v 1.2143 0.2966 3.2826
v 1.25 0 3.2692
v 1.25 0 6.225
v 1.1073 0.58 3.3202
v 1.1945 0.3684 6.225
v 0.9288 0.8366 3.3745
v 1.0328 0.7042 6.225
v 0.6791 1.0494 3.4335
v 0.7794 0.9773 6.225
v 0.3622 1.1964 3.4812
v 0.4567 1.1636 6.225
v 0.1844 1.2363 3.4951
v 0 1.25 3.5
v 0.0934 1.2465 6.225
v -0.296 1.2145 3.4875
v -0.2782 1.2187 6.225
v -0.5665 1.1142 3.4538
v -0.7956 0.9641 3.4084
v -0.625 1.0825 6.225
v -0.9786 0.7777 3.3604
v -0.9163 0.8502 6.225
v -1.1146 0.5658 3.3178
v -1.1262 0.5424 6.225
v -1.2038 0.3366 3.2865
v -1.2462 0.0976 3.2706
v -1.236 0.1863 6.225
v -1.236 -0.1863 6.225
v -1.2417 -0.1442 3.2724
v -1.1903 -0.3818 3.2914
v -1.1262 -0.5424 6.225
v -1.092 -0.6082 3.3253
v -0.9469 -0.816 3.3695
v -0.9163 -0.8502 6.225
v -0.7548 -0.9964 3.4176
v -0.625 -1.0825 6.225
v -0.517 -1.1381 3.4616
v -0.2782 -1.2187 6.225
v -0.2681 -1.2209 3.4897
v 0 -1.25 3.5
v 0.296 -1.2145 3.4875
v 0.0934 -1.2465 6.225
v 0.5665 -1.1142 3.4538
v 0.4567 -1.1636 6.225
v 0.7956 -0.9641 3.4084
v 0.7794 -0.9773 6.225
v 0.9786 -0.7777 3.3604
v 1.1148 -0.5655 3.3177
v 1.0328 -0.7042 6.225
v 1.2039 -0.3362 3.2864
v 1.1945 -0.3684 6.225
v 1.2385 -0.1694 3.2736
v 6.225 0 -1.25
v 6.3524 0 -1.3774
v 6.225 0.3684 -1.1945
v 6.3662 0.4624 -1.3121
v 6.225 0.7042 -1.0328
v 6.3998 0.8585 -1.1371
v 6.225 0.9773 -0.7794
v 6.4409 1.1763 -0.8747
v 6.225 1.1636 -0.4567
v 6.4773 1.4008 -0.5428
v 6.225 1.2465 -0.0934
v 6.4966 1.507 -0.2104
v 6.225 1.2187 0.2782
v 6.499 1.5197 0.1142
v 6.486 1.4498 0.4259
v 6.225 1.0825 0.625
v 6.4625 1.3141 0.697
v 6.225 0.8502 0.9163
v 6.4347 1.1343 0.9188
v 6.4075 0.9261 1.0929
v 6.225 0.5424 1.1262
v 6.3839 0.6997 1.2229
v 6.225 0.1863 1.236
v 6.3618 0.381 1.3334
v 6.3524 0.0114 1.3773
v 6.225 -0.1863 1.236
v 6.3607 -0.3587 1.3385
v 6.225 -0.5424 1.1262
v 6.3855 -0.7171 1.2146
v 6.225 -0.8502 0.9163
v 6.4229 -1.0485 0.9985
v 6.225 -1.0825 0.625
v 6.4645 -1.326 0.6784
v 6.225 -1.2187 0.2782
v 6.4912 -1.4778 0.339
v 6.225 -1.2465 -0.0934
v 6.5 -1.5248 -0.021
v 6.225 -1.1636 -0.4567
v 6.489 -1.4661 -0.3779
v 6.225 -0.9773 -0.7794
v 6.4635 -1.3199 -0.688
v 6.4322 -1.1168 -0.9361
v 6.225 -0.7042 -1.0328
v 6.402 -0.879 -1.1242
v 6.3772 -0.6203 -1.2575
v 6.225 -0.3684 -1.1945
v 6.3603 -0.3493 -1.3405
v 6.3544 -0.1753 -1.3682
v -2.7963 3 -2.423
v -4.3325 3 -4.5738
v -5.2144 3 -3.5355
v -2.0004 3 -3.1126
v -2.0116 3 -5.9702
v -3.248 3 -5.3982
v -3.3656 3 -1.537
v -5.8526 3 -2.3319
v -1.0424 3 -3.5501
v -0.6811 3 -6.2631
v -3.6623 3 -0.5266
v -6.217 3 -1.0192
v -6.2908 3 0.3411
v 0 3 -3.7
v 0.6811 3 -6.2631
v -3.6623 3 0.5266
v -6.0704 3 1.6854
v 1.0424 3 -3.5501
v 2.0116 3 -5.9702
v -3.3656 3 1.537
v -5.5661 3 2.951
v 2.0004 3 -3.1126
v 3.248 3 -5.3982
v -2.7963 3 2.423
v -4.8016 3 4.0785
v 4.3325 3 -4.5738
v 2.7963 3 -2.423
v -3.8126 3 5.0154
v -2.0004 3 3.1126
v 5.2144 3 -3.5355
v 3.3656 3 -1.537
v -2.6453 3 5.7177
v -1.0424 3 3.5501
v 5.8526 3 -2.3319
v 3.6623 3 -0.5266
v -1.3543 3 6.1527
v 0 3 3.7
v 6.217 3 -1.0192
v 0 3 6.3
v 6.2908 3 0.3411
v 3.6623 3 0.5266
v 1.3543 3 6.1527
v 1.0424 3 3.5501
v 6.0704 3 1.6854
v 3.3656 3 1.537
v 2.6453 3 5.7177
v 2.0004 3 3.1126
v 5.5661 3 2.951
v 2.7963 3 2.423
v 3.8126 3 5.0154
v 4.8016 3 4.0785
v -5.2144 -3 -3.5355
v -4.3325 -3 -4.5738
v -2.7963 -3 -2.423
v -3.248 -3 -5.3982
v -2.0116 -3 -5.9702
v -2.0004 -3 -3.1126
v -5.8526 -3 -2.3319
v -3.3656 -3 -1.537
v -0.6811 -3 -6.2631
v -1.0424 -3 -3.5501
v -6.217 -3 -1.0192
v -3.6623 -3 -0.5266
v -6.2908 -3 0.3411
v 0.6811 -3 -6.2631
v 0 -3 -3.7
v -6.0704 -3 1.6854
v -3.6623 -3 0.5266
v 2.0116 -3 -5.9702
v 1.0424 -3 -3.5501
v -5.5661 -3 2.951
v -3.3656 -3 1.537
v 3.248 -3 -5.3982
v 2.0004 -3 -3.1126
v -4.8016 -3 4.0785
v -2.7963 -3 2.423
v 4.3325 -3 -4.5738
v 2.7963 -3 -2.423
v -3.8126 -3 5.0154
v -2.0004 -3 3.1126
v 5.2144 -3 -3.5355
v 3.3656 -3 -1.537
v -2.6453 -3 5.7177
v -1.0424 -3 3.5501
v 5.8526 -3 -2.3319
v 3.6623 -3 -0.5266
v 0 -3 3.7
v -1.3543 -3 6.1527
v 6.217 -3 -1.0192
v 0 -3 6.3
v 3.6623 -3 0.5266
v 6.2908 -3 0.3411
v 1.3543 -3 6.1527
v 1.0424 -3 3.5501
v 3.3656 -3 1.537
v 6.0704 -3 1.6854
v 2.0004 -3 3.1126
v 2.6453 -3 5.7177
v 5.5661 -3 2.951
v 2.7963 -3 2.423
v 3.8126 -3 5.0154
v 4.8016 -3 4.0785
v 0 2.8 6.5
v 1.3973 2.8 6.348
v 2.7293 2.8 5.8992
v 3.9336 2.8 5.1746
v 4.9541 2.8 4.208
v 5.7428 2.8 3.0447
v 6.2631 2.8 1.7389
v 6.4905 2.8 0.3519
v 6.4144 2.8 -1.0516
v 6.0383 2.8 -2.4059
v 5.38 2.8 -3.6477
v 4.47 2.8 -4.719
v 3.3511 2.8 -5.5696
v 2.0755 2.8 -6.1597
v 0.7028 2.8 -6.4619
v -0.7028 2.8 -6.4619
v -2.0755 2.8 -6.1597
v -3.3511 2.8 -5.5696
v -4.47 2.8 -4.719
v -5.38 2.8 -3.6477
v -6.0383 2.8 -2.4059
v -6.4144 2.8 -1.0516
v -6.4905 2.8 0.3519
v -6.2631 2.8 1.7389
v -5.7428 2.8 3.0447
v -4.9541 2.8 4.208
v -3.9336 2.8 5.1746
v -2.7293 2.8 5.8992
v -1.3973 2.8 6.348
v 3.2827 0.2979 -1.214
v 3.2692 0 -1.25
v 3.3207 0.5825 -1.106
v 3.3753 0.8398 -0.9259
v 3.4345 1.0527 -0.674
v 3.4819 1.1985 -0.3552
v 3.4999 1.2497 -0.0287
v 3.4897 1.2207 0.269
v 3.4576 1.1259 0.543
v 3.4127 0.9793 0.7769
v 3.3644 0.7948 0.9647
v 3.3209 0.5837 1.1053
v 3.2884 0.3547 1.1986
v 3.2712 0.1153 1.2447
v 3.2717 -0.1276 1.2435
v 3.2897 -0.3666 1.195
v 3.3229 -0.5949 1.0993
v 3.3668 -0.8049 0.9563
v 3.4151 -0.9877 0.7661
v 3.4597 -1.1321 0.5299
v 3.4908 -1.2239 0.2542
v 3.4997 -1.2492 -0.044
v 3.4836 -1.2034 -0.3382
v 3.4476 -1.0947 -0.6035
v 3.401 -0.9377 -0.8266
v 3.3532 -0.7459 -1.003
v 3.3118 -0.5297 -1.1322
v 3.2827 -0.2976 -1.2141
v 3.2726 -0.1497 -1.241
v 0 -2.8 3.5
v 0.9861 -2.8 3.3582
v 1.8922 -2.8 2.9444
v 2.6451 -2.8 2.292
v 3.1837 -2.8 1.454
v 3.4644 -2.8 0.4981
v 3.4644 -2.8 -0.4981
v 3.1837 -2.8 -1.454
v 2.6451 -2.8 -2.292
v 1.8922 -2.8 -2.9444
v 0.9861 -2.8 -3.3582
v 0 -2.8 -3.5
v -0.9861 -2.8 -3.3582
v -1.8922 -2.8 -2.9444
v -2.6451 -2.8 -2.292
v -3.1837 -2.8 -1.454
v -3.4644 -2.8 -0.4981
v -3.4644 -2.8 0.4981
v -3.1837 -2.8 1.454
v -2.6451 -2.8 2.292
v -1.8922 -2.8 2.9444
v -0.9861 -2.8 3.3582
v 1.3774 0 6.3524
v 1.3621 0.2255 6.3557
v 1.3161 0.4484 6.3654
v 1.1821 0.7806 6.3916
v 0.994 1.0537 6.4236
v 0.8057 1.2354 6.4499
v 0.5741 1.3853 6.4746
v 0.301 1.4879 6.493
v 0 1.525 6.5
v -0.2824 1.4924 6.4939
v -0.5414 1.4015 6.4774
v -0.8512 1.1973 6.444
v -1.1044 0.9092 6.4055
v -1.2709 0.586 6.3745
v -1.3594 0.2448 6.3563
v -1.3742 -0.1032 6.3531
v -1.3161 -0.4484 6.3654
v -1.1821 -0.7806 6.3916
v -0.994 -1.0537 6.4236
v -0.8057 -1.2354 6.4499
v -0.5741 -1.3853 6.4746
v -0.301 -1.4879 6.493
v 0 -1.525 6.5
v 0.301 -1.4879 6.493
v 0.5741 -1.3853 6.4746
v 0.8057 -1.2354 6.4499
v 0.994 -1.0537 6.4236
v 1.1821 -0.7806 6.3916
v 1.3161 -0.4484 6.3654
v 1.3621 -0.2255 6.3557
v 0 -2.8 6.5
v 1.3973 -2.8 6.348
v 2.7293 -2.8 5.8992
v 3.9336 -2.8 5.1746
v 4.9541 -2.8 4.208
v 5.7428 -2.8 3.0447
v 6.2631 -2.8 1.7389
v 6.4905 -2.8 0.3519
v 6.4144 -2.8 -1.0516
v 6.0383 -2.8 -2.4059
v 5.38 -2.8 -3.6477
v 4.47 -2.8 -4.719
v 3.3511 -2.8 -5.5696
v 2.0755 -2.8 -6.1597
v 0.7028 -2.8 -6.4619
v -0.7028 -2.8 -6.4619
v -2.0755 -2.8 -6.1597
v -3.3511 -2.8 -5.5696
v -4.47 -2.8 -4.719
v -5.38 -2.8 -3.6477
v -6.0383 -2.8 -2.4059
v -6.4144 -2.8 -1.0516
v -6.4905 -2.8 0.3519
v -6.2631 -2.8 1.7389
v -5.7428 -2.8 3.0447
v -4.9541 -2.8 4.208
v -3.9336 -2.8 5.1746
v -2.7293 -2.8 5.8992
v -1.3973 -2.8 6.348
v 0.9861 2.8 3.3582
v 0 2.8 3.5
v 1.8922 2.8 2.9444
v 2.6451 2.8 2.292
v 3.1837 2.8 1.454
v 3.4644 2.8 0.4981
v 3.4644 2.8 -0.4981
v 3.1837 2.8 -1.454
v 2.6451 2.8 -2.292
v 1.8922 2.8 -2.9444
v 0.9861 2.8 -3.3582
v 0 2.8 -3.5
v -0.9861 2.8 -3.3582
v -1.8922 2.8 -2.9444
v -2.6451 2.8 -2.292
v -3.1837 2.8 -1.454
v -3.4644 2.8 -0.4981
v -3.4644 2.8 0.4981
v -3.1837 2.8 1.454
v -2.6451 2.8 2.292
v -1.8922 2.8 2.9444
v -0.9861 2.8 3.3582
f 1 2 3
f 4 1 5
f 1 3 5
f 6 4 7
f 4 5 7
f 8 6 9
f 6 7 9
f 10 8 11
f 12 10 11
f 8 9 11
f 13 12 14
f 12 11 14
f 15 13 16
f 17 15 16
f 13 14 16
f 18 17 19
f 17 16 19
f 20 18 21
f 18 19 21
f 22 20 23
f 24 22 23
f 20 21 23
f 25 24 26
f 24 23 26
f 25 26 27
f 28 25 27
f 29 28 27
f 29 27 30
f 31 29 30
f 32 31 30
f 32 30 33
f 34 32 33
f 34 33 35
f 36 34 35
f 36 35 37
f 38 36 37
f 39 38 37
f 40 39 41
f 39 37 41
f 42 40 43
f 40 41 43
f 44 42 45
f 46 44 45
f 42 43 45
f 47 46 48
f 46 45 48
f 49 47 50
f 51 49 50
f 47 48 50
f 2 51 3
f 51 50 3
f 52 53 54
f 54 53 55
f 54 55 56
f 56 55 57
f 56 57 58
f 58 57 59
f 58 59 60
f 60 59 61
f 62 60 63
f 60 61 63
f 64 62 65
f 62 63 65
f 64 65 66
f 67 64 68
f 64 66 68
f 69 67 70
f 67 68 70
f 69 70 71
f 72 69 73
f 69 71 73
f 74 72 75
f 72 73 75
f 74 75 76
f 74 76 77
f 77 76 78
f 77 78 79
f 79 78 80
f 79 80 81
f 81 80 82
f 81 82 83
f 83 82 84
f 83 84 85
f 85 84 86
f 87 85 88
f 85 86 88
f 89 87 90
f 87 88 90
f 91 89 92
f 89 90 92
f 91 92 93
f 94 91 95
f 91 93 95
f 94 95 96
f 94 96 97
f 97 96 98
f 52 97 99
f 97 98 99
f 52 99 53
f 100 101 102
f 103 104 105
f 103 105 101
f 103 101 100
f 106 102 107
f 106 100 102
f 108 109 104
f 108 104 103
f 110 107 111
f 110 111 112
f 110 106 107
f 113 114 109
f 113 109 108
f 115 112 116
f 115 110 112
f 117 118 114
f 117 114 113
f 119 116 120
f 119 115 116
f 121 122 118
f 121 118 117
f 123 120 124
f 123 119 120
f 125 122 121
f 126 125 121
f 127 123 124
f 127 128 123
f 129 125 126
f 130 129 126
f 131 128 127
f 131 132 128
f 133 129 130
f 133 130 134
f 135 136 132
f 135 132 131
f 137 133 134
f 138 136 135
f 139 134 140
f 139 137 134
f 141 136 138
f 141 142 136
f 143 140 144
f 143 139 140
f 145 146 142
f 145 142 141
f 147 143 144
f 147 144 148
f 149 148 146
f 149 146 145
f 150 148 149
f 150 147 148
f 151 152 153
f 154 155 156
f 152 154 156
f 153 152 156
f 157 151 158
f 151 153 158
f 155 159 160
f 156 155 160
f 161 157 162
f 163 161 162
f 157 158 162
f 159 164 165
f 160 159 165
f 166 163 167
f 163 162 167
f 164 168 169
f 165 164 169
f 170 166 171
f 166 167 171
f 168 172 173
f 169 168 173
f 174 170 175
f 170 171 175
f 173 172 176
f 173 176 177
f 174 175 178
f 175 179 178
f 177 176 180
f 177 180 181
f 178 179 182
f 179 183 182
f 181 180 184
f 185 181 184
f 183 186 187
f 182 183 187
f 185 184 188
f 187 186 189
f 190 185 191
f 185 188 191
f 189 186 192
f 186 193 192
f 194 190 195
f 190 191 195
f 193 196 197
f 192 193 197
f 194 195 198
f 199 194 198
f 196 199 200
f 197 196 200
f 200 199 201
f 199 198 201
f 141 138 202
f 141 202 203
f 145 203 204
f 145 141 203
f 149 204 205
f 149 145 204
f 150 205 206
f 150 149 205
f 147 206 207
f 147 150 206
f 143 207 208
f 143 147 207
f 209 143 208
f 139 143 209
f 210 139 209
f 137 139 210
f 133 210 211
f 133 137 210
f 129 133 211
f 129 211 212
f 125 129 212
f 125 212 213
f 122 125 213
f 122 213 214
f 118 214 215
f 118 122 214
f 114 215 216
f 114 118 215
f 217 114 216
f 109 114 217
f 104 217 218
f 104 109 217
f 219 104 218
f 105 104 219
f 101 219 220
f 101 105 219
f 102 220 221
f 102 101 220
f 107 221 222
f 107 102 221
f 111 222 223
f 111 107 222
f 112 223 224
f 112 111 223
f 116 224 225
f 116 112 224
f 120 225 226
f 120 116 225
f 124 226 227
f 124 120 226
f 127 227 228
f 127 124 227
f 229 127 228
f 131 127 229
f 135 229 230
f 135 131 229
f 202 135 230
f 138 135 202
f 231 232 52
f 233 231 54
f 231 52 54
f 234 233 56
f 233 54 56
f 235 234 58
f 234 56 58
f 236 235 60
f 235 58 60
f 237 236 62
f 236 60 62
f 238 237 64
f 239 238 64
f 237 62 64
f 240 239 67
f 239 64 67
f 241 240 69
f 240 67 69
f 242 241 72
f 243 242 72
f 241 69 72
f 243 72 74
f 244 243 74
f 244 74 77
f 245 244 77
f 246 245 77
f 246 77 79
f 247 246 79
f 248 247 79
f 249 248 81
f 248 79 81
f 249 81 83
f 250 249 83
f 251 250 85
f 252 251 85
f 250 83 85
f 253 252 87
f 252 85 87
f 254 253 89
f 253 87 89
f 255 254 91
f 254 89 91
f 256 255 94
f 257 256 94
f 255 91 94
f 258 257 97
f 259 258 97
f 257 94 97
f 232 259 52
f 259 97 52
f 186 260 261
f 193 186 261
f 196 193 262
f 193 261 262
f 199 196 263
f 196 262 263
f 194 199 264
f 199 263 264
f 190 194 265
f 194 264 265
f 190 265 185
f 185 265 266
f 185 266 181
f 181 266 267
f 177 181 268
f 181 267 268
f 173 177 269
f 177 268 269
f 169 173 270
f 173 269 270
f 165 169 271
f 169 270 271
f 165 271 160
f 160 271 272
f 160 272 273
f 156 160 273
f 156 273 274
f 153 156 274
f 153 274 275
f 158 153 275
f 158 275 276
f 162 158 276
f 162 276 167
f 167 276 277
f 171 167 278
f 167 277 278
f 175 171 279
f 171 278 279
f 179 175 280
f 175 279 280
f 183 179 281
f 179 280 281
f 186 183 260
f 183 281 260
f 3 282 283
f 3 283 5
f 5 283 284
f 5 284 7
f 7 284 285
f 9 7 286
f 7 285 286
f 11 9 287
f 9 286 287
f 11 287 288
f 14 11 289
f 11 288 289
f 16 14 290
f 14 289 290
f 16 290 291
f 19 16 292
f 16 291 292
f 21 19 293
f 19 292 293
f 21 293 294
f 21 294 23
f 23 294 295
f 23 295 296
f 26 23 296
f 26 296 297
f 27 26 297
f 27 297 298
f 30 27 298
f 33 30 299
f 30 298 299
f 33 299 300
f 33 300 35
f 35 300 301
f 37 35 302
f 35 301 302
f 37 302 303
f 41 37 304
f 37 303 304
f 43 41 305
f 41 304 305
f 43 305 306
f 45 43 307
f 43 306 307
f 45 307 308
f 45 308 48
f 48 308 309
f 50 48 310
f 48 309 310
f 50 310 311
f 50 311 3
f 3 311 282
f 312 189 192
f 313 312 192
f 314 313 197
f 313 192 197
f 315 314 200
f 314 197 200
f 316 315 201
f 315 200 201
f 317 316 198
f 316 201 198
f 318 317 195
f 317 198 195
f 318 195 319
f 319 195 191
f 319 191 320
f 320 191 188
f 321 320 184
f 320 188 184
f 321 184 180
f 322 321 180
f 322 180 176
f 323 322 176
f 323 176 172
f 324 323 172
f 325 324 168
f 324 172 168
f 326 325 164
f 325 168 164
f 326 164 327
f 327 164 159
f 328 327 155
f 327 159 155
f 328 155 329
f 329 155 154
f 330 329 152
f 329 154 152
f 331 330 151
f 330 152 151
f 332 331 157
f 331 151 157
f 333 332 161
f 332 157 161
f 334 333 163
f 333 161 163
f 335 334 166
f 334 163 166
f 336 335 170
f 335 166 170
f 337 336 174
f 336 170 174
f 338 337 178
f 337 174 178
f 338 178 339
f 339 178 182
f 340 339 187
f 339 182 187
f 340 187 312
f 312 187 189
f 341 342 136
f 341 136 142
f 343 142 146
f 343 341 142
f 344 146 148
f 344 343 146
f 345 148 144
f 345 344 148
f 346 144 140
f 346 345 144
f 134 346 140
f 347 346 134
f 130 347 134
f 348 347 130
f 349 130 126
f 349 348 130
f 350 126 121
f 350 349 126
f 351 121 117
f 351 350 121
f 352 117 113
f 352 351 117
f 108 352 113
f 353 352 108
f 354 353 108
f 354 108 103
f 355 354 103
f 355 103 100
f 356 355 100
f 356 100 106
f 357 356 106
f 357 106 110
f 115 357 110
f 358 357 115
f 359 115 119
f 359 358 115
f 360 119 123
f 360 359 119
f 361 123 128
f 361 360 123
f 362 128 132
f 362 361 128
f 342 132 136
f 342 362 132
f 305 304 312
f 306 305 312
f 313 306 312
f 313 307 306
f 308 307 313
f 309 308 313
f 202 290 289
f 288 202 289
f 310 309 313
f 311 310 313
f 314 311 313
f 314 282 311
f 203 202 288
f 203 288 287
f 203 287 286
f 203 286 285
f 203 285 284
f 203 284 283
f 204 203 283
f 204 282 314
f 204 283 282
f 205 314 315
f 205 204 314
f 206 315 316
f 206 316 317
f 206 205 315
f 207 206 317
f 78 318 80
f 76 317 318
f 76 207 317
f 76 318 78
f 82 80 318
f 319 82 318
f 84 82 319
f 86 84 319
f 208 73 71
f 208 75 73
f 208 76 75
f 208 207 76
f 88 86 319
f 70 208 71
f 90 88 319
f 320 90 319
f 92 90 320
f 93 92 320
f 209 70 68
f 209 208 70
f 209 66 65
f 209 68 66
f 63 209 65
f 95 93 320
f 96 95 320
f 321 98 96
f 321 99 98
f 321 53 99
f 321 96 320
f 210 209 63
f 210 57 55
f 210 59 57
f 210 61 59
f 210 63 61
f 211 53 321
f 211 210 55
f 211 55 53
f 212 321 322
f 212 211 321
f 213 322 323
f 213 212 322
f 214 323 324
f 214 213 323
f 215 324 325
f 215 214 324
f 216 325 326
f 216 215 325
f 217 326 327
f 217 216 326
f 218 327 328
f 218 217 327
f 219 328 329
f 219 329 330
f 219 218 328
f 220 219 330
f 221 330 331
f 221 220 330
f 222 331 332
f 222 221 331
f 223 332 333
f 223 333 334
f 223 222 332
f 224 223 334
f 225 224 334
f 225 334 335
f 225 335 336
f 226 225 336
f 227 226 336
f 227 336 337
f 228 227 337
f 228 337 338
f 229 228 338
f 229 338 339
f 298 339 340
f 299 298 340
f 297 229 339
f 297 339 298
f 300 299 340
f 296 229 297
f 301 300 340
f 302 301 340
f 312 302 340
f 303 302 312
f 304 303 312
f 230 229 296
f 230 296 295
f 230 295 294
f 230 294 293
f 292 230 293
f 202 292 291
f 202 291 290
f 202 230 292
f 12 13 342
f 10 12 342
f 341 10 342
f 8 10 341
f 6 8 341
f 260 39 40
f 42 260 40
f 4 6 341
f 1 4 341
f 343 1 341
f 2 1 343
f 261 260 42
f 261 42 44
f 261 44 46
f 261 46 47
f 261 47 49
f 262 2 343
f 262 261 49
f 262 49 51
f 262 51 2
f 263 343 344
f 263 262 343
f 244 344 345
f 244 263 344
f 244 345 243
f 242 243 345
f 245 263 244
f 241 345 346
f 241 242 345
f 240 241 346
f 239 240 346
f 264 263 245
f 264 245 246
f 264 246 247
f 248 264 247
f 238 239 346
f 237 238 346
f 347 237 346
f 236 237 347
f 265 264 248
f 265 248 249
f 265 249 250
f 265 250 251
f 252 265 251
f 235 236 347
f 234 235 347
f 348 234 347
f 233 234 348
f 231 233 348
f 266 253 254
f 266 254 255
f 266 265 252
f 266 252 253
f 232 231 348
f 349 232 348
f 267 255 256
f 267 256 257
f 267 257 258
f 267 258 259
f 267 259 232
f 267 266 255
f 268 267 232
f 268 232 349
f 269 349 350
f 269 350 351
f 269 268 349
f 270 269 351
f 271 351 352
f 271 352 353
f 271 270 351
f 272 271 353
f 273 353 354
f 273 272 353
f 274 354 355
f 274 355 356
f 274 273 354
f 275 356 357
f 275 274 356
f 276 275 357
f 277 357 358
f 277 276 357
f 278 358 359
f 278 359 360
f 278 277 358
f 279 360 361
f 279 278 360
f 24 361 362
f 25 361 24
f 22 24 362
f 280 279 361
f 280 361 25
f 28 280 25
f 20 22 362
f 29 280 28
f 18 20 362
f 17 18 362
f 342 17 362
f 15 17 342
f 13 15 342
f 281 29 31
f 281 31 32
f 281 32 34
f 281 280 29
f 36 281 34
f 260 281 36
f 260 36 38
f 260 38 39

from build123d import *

# Parameters (mm, degrees)
PROFILES_R        = 6.5
PROFILES_R_2      = 3.5
PROFILE_DEPTH     = 3
CIRPATTERN1_COUNT = 2
CIRPATTERN1_ANGLE = 90
OUTERC_SIZE       = 0.2
INNERC_SIZE       = 0.2


# Read off the part's stored shape, not the designer's step:  Tapped Hole1
with BuildPart() as part:
    # ProfileS → Profile (new, symmetric)
    with BuildSketch(Plane(origin=(0, 0, 0), x_dir=(1, 0, 0), z_dir=(0, 1, 0))):
        with Locations(Location((0, 0, 0), (0, 0, 270))):
            Circle(PROFILES_R)
        with Locations(Location((0, 0, 0), (0, 0, 270))):
            Circle(PROFILES_R_2, mode=Mode.SUBTRACT)
    extrude(amount=PROFILE_DEPTH, both=True)

    # Tapped Hole1 outline → Tapped Hole1 (revolve, cut)
    with BuildSketch(Plane.XZ):
        Polygon((1.525000359, 6.500000359), (0, 6.500000359), (0, 3.269069771), (1.25, 3.269069771), (1.25, 6.225), align=None)
    tapped_hole1 = revolve(axis=Axis((0, 0, 0), (0, 0, 1)), mode=Mode.SUBTRACT)

    # CirPattern1: Tapped Hole1 ×2 about axis
    cirpattern1_axis = Axis((0, 3, 0), (0, 1, 0))
    for i in range(1, CIRPATTERN1_COUNT):
        add(tapped_hole1.rotate(cirpattern1_axis, i * CIRPATTERN1_ANGLE / (CIRPATTERN1_COUNT - 1)), mode=Mode.SUBTRACT)

    # OuterC
    outerc_edges = [part.edges().sort_by_distance(p)[0] for p in [
        (0, -3, -6.5),
        (0, 3, -6.5),
    ]]
    chamfer(outerc_edges, length=OUTERC_SIZE)

    # InnerC
    innerc_edges = [part.edges().sort_by_distance(p)[0] for p in [
        (0, -3, -3.5),
        (0, 3, -3.5),
    ]]
    chamfer(innerc_edges, length=INNERC_SIZE)


solid = part.part
